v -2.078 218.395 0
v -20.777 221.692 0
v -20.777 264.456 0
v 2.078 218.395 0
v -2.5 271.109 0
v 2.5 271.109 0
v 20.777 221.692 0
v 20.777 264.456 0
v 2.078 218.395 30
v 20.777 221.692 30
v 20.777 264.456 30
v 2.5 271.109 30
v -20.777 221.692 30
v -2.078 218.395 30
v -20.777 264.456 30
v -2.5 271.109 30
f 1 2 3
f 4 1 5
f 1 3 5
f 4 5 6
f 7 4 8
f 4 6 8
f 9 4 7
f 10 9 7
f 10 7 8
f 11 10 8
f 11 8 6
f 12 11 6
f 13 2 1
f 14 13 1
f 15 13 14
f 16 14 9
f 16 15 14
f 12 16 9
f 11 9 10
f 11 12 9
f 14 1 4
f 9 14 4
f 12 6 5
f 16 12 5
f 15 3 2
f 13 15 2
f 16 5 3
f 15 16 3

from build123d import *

# Parameters (mm, degrees)
BOSS_EXTRUDE1_DEPTH = 30


with BuildPart() as part:
    # Sketch1 → Boss-Extrude1 (new body)
    with BuildSketch(Plane.XY):
        with BuildLine():
            Line((0, 271.108554652), (-2.5, 271.108554652))
            Line((-2.5, 271.108554652), (-20.776742097, 264.45636455))
            Line((-20.776742097, 264.45636455), (-20.776742097, 221.692084557))
            Line((-20.776742097, 221.692084557), (-2.07767421, 218.394934374))
            Line((-2.07767421, 218.394934374), (0, 218.394934374))
            add(Edge.make_bspline(
                [(0, 218.394934374), (0, 235.966141134), (0, 253.537347893), (0, 271.108554652)],
                knots=[0.805688603, 0.805688603, 0.805688603, 0.805688603, 1, 1, 1, 1], degree=3))
        make_face()
        with BuildLine():
            Line((2.5, 271.108554652), (0, 271.108554652))
            add(Edge.make_bspline(
                [(0, 218.394934374), (0, 235.966141134), (0, 253.537347893), (0, 271.108554652)],
                knots=[0.805688603, 0.805688603, 0.805688603, 0.805688603, 1, 1, 1, 1], degree=3))
            Line((0, 218.394934374), (2.07767421, 218.394934374))
            Line((2.07767421, 218.394934374), (20.776742097, 221.692084557))
            Line((20.776742097, 221.692084557), (20.776742097, 264.45636455))
            Line((20.776742097, 264.45636455), (2.5, 271.108554652))
        make_face()
    extrude(amount=BOSS_EXTRUDE1_DEPTH)


solid = part.part
